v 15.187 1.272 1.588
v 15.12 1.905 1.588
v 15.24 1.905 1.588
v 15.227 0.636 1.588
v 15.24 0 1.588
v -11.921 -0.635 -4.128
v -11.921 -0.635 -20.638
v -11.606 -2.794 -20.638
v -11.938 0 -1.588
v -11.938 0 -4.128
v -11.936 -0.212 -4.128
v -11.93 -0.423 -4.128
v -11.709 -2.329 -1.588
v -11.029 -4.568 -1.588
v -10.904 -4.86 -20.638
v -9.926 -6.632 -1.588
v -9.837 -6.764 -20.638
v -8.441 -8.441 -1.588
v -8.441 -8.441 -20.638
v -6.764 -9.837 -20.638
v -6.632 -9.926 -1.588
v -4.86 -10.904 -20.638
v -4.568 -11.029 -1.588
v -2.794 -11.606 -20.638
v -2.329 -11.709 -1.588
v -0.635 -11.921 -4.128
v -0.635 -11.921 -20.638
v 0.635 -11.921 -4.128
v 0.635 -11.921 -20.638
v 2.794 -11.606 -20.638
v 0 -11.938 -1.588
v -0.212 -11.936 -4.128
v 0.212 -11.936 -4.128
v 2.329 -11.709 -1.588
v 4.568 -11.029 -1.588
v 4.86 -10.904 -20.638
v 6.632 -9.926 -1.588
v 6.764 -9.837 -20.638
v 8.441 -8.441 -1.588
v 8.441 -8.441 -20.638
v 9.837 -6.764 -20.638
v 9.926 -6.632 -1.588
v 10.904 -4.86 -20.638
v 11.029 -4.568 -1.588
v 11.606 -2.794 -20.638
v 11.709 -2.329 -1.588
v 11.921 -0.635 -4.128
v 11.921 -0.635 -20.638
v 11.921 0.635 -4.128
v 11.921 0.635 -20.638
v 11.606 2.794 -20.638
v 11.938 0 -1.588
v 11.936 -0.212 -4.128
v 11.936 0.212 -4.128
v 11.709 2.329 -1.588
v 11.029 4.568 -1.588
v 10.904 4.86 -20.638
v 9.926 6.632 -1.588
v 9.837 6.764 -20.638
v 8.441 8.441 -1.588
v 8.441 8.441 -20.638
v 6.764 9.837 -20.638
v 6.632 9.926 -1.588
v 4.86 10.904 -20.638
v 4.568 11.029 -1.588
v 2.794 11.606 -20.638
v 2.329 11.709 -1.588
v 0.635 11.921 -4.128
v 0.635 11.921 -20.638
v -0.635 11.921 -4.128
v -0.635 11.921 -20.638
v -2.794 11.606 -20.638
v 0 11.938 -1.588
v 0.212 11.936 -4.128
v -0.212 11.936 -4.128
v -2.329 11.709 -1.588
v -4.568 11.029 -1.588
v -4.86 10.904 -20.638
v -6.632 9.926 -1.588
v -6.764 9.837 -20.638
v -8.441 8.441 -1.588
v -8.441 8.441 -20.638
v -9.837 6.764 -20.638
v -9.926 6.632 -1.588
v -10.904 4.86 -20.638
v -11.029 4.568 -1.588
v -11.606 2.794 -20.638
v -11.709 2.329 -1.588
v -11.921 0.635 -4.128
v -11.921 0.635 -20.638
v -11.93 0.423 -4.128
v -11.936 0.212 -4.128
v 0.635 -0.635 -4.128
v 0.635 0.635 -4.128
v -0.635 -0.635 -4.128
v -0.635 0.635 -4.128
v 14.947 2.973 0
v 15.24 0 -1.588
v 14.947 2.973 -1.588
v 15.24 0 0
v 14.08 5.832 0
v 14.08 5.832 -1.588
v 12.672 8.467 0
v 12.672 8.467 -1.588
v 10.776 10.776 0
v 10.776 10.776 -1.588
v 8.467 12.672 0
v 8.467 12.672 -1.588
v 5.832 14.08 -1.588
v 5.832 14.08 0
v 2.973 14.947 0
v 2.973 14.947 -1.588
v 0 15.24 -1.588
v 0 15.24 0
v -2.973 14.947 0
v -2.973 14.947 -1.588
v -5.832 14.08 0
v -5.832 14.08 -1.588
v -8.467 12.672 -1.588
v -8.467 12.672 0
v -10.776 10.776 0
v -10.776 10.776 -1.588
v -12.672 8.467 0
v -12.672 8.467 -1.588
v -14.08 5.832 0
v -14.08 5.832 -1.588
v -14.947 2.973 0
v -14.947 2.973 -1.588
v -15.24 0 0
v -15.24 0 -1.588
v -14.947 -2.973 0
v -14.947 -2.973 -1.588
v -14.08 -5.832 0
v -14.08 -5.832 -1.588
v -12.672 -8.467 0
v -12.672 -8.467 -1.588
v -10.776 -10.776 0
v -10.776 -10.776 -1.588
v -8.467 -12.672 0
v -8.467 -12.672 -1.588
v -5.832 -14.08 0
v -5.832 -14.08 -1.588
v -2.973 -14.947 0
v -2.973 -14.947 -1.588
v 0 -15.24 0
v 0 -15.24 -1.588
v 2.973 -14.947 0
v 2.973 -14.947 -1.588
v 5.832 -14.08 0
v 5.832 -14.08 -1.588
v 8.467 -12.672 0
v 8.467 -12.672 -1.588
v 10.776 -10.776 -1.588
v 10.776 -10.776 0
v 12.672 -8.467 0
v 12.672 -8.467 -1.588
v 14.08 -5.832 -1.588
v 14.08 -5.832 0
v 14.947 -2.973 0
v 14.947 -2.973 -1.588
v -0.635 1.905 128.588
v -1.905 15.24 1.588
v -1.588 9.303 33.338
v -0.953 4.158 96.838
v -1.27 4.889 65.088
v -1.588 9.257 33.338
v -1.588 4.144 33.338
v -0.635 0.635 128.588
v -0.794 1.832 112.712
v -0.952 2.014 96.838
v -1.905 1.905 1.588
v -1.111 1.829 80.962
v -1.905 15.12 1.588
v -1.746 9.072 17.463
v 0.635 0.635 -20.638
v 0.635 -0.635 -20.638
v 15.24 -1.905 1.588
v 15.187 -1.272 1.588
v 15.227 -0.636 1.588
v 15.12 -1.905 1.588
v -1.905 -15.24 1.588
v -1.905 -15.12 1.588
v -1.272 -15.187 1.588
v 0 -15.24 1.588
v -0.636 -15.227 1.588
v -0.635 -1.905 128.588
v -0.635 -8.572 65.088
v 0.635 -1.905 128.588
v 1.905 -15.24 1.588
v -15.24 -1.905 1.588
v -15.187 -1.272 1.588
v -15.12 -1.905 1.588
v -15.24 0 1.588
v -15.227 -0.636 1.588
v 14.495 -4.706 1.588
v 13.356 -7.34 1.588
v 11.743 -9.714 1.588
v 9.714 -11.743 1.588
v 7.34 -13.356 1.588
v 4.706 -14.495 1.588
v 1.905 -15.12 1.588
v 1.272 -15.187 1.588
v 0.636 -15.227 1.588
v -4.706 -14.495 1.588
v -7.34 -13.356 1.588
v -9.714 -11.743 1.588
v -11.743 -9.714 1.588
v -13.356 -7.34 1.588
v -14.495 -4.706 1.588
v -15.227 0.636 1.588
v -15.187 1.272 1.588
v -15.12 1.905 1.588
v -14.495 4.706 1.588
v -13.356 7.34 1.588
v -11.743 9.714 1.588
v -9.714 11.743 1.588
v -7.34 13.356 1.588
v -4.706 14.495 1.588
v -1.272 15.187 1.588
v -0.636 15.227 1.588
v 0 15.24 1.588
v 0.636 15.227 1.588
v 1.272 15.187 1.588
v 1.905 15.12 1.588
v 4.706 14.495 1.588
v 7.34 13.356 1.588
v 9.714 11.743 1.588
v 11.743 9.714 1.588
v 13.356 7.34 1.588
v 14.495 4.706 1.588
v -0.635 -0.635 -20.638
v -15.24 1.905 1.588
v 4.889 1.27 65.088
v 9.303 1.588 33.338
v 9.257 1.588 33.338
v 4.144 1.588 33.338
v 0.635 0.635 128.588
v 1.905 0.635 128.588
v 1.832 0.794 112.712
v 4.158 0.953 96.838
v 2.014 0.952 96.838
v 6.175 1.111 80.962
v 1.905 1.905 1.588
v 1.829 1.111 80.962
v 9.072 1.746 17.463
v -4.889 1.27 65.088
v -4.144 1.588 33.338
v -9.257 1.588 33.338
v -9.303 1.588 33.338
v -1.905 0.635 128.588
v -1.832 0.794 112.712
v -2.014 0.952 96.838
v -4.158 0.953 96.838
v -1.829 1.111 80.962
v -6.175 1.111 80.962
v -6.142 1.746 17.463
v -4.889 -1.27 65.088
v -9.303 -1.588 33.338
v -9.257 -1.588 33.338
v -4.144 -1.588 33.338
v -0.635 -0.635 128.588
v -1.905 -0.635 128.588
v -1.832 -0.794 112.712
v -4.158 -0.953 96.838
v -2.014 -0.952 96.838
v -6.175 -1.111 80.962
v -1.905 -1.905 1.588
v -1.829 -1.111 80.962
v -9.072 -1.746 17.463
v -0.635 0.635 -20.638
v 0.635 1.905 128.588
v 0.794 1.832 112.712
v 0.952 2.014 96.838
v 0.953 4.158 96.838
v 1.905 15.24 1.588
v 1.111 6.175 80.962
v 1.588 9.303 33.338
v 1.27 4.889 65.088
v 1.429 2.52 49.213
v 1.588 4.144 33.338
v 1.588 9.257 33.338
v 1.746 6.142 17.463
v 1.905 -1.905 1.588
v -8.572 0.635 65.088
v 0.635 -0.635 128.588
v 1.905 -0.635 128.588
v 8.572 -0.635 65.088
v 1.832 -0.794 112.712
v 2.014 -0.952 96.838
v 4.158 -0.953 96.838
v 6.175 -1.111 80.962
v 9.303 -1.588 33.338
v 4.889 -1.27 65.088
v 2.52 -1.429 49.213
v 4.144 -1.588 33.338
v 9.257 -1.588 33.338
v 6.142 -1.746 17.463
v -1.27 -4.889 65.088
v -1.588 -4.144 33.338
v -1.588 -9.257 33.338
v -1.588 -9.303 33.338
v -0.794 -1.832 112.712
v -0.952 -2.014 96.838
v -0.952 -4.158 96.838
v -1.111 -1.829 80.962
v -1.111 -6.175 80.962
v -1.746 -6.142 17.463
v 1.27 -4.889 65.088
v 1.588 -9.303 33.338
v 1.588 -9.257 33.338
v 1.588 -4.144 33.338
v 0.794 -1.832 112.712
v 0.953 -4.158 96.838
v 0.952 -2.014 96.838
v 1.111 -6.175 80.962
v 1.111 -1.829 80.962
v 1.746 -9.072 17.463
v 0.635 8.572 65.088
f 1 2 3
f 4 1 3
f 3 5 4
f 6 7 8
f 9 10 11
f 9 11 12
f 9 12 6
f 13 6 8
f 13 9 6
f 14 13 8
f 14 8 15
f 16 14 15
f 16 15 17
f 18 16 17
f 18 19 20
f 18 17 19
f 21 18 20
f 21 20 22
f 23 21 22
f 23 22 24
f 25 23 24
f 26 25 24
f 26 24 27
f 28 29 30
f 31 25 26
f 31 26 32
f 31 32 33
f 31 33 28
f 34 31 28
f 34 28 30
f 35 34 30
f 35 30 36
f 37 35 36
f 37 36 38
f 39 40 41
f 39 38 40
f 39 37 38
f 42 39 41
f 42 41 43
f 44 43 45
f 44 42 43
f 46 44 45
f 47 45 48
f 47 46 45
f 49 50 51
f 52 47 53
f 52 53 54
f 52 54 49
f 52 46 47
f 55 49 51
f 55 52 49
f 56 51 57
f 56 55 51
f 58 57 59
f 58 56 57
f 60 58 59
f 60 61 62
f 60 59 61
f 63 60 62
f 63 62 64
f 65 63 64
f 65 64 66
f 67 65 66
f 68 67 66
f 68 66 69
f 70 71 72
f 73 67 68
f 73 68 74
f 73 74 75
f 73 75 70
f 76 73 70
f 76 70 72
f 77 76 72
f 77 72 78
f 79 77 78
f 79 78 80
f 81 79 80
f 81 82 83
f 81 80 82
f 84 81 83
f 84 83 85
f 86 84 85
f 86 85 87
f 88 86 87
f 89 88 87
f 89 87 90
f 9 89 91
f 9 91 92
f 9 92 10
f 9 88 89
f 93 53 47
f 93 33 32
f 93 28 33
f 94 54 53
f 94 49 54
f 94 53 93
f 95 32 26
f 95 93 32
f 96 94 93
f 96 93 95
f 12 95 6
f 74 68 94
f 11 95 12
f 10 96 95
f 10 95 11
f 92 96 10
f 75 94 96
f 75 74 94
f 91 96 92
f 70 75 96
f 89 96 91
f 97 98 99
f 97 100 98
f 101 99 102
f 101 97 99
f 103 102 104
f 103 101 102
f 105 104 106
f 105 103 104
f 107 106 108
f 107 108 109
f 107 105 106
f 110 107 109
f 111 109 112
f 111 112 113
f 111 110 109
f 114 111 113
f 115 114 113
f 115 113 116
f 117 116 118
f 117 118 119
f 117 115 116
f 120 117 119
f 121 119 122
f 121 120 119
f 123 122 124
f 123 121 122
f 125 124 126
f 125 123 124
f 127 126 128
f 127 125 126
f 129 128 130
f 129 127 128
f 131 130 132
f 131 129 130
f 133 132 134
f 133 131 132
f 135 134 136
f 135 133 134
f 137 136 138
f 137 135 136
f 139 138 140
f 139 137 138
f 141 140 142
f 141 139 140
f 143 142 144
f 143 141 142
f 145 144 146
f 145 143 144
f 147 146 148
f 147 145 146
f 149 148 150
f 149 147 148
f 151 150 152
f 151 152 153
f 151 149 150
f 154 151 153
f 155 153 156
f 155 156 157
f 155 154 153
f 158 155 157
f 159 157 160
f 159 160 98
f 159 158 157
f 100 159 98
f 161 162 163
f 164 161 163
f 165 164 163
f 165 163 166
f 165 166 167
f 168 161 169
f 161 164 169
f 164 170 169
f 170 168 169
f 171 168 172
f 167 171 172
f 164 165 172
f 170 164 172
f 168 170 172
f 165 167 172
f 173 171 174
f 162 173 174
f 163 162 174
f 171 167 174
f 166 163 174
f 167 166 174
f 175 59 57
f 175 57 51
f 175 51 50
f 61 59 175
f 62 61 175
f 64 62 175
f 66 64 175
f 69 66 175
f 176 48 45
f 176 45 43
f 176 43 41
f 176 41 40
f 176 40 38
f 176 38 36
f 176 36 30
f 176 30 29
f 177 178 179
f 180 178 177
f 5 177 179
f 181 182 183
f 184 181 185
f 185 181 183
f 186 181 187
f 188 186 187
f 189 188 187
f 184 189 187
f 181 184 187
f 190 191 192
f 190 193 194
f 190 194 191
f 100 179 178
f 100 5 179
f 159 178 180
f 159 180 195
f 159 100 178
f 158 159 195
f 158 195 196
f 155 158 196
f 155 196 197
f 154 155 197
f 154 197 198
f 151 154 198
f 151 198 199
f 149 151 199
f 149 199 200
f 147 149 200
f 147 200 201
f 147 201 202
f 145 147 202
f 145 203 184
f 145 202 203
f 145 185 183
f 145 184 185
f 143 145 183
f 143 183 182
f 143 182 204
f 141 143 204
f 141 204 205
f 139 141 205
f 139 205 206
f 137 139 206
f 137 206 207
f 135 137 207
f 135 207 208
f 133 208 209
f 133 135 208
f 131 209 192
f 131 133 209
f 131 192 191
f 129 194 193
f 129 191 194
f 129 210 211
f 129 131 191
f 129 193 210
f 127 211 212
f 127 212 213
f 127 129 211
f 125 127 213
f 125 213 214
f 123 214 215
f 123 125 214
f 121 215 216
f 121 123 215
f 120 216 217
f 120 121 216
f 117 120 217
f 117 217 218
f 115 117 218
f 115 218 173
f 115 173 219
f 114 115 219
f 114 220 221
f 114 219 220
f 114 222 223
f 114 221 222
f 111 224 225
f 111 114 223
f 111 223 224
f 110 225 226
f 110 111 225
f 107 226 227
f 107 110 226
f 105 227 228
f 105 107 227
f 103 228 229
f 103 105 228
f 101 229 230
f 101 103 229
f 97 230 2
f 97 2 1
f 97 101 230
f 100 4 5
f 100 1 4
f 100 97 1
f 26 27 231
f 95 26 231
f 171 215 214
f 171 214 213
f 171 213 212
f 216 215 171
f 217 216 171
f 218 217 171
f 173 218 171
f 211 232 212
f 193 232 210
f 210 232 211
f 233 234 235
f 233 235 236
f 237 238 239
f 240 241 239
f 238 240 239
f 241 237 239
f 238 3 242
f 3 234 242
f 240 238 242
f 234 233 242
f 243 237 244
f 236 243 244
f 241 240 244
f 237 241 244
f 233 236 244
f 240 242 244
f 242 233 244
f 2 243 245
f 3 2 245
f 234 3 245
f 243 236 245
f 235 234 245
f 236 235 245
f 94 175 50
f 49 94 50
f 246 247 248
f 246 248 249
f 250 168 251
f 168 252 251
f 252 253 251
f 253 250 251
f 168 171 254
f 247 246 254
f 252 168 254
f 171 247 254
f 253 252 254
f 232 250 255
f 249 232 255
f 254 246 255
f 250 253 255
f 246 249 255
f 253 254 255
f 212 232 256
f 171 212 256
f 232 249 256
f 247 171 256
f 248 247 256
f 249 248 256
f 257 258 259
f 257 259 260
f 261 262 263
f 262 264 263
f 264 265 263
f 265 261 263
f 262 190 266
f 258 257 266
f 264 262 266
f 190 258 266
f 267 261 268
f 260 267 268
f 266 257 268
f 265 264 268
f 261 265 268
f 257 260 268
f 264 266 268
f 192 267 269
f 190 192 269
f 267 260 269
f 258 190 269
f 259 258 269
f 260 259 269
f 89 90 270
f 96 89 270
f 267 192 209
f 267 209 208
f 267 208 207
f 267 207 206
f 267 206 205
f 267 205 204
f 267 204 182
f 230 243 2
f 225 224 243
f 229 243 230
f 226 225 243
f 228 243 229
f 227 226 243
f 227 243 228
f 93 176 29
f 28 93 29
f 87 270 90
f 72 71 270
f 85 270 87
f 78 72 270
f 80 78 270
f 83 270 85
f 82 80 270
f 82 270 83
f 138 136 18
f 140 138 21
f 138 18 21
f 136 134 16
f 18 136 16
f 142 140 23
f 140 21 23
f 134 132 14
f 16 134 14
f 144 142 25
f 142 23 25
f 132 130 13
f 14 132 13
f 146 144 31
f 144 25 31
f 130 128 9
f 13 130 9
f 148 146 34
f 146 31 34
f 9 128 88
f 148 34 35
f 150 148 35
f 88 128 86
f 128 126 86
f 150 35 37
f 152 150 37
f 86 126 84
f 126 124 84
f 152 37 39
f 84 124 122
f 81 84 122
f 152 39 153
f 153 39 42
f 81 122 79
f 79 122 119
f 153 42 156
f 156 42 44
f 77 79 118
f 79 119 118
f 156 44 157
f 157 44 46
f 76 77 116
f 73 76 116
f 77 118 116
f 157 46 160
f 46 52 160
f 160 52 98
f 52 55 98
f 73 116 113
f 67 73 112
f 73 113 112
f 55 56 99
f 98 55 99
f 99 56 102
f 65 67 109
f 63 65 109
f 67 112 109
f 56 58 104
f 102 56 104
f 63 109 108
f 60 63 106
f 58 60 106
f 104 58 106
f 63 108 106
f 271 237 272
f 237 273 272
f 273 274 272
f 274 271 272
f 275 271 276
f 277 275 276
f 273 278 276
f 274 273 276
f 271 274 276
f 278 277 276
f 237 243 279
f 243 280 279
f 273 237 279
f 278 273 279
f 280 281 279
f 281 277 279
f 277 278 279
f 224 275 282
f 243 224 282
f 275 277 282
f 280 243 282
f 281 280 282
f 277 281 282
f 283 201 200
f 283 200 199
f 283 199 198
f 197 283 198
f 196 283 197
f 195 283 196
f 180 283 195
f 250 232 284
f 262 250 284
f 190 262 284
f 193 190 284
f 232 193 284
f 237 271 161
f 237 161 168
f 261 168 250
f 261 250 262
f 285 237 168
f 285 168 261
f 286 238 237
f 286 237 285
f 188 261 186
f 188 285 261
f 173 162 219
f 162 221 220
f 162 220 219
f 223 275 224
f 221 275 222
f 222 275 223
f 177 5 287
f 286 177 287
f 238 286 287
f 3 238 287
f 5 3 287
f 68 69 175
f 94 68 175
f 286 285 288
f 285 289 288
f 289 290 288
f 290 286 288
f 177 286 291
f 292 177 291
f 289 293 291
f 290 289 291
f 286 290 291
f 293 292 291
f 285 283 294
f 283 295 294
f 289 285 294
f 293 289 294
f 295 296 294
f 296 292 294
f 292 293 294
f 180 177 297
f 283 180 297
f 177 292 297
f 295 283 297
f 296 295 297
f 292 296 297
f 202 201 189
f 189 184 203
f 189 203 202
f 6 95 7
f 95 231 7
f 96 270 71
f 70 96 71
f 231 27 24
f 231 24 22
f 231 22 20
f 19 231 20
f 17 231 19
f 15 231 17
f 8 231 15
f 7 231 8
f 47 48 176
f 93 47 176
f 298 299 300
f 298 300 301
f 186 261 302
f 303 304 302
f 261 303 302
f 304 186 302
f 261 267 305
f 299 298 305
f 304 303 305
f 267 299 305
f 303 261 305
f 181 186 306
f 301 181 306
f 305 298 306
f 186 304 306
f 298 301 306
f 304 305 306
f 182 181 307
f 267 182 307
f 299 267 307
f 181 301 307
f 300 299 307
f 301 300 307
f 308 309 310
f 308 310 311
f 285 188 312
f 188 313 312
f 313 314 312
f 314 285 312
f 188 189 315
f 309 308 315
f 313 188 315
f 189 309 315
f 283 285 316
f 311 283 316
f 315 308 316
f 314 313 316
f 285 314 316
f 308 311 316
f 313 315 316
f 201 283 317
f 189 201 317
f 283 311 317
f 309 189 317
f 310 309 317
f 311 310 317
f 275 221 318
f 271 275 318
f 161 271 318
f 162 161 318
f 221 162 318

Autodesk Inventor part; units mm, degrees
ref_plane "YZ Plane" through (0, 0, 0) normal (1, 0, 0) x (0, 1, 0)
ref_plane "XZ Plane" through (0, 0, 0) normal (0, 1, 0) x (-1, 0, 0)
sketch "Sketch1" plane through (0, 0, 0) normal (0, 0, 1) x (1, 0, 0)
  circle A0 centre (0, 0) radius 15.24
  dimension "d0" = 30.48
extrude "Extrusion1" add sketch "Sketch1" along normal mid plane 3.175
sketch "Sketch2" plane through (0, 0, -1.5875) normal (0, 0, -1) x (-1, 0, 0)
  circle A0 centre (0, 0) radius 11.938
  dimension "d3" = 23.876
extrude "Extrusion2" add sketch "Sketch2" along normal blind 19.05
sketch "Sketch4" plane through (0, 0, 1.5875) normal (0, 0, 1) x (1, 0, 0)
  line L0 (-15.24, 1.905) -> (-15.24, -1.905)
  line L1 (-15.24, -1.905) -> (-1.905, -1.905)
  line L2 (-1.905, -1.905) -> (-1.905, -15.24)
  line L3 (-1.905, -15.24) -> (1.905, -15.24)
  line L4 (1.905, -15.24) -> (1.905, -1.905)
  line L5 (1.905, -1.905) -> (15.24, -1.905)
  line L6 (15.24, -1.905) -> (15.24, 1.905)
  line L7 (15.24, 1.905) -> (1.905, 1.905)
  line L8 (1.905, 1.905) -> (1.905, 15.24)
  line L9 (1.905, 15.24) -> (-1.905, 15.24)
  line L10 (-1.905, 15.24) -> (-1.905, 1.905)
  line L11 (-1.905, 1.905) -> (-15.24, 1.905)
  line L12 (-15.2163, 0) -> (15.24, 0) construction
  circle A0 centre (0, 0) radius 15.24 construction
  line L13 (0.0118, 15.24) -> (0, -15.24) construction
  dimension "d7" = 15.24
  dimension "d8" = 15.24
  dimension "d31" = 3.81
  dimension "d10" = 1.905
  dimension "d11" = 3.81
ref_plane "Work Plane1" through (0, 0, 128.5875) normal (0, 0, 1) x (1, 0, 0)
sketch "Sketch5" plane through (0, 0, 128.5875) normal (0, 0, 1) x (1, 0, 0)
  line L0 (-0.635, 1.905) -> (-0.635, 0.635)
  line L1 (-0.635, 0.635) -> (-1.905, 0.635)
  line L2 (-1.905, 0.635) -> (-1.905, -0.635)
  line L3 (-1.905, -0.635) -> (-0.635, -0.635)
  line L4 (-0.635, -0.635) -> (-0.635, -1.905)
  line L5 (-0.635, -1.905) -> (0.635, -1.905)
  line L6 (0.635, -1.905) -> (0.635, -0.635)
  line L7 (0.635, -0.635) -> (1.905, -0.635)
  line L8 (1.905, -0.635) -> (1.905, 0.635)
  line L9 (1.905, 0.635) -> (0.635, 0.635)
  line L10 (0.635, 1.905) -> (-0.635, 1.905)
  line L11 (0.635, 1.905) -> (0.635, 0.635)
  point P0 (0, 0)
  dimension "d23" = 1.27
  dimension "d24" = 0.635
  dimension "d25" = 0.635
  dimension "d26" = 3.81
  dimension "d27" = 1.905
  dimension "d28" = 1.905
  dimension "d29" = 3.81
  dimension "d30" = 1.27
loft "Loft1" add profiles "Sketch5", "Sketch4"
sketch "Sketch6" plane through (0, 0, -20.6375) normal (0, 0, -1) x (-1, 0, 0)
  line L0 (-13.208, -0.635) -> (13.208, -0.635)
  line L1 (13.208, -0.635) -> (13.208, 0.635)
  line L2 (13.208, 0.635) -> (-13.208, 0.635)
  line L3 (-13.208, 0.635) -> (-13.208, -0.635)
  line L4 (-13.208, -0.635) -> (13.208, 0.635) construction
  line L5 (13.208, -0.635) -> (-13.208, 0.635) construction
  line L6 (-0.635, 13.208) -> (-0.635, -13.208)
  line L7 (-0.635, -13.208) -> (0.635, -13.208)
  line L8 (0.635, -13.208) -> (0.635, 13.208)
  line L9 (0.635, 13.208) -> (-0.635, 13.208)
  line L10 (-0.635, 13.208) -> (0.635, -13.208) construction
  line L11 (-0.635, -13.208) -> (0.635, 13.208) construction
  point P0 (0, 0)
  dimension "d18" = 1.27
  dimension "d19" = 26.416
extrude "Extrusion3" cut sketch "Sketch6" against normal blind 16.51
equation "\"d0\" = outerDiam"
equation "\"d1\" = supportThickness"
equation "\"d3\" = lightSupportDiam"
equation "\"d4\" = lightSupportLength"
equation "\"d7\" = 0.5 * outerDiam"
equation "\"d8\" = 0.5 * outerDiam"
equation "\"d31\" = vaneThickness"
equation "\"d10\" = 0.5 * vaneThickness"
equation "\"d11\" = vaneThickness"
equation "\"d23\" = 0.333333 * vaneEndDiam"
equation "\"d24\" = 0.166667 * vaneEndDiam"
equation "\"d25\" = 0.166667 * vaneEndDiam"
equation "\"d26\" = vaneEndDiam"
equation "\"d27\" = 0.5 * vaneEndDiam"
equation "\"d28\" = 0.5 * vaneEndDiam"
equation "\"d29\" = vaneEndDiam"
equation "\"d30\" = 0.333333 * vaneEndDiam"
equation "\"d18\" = lightSlotWidth"
equation "\"d19\" = lightSlotLength"
equation "\"d20\" = lightSlotDepth"
equation "\"outerDiam\" = 30.48"
equation "\"supportThickness\" = 3.175"
equation "\"lightSupportDiam\" = 23.876"
equation "\"lightSupportLength\" = 19.05"
equation "\"groundLength\" = 127"
equation "\"d12\" = groundLength"
equation "\"lightSlotWidth\" = 1.27"
equation "\"vaneEndDiam\" = 3.81"
equation "\"vaneThickness\" = 3.81"
equation "\"lightSlotLength\" = 26.416"
equation "\"lightSlotDepth\" = 16.51"
properties part number "GroundSupport"
